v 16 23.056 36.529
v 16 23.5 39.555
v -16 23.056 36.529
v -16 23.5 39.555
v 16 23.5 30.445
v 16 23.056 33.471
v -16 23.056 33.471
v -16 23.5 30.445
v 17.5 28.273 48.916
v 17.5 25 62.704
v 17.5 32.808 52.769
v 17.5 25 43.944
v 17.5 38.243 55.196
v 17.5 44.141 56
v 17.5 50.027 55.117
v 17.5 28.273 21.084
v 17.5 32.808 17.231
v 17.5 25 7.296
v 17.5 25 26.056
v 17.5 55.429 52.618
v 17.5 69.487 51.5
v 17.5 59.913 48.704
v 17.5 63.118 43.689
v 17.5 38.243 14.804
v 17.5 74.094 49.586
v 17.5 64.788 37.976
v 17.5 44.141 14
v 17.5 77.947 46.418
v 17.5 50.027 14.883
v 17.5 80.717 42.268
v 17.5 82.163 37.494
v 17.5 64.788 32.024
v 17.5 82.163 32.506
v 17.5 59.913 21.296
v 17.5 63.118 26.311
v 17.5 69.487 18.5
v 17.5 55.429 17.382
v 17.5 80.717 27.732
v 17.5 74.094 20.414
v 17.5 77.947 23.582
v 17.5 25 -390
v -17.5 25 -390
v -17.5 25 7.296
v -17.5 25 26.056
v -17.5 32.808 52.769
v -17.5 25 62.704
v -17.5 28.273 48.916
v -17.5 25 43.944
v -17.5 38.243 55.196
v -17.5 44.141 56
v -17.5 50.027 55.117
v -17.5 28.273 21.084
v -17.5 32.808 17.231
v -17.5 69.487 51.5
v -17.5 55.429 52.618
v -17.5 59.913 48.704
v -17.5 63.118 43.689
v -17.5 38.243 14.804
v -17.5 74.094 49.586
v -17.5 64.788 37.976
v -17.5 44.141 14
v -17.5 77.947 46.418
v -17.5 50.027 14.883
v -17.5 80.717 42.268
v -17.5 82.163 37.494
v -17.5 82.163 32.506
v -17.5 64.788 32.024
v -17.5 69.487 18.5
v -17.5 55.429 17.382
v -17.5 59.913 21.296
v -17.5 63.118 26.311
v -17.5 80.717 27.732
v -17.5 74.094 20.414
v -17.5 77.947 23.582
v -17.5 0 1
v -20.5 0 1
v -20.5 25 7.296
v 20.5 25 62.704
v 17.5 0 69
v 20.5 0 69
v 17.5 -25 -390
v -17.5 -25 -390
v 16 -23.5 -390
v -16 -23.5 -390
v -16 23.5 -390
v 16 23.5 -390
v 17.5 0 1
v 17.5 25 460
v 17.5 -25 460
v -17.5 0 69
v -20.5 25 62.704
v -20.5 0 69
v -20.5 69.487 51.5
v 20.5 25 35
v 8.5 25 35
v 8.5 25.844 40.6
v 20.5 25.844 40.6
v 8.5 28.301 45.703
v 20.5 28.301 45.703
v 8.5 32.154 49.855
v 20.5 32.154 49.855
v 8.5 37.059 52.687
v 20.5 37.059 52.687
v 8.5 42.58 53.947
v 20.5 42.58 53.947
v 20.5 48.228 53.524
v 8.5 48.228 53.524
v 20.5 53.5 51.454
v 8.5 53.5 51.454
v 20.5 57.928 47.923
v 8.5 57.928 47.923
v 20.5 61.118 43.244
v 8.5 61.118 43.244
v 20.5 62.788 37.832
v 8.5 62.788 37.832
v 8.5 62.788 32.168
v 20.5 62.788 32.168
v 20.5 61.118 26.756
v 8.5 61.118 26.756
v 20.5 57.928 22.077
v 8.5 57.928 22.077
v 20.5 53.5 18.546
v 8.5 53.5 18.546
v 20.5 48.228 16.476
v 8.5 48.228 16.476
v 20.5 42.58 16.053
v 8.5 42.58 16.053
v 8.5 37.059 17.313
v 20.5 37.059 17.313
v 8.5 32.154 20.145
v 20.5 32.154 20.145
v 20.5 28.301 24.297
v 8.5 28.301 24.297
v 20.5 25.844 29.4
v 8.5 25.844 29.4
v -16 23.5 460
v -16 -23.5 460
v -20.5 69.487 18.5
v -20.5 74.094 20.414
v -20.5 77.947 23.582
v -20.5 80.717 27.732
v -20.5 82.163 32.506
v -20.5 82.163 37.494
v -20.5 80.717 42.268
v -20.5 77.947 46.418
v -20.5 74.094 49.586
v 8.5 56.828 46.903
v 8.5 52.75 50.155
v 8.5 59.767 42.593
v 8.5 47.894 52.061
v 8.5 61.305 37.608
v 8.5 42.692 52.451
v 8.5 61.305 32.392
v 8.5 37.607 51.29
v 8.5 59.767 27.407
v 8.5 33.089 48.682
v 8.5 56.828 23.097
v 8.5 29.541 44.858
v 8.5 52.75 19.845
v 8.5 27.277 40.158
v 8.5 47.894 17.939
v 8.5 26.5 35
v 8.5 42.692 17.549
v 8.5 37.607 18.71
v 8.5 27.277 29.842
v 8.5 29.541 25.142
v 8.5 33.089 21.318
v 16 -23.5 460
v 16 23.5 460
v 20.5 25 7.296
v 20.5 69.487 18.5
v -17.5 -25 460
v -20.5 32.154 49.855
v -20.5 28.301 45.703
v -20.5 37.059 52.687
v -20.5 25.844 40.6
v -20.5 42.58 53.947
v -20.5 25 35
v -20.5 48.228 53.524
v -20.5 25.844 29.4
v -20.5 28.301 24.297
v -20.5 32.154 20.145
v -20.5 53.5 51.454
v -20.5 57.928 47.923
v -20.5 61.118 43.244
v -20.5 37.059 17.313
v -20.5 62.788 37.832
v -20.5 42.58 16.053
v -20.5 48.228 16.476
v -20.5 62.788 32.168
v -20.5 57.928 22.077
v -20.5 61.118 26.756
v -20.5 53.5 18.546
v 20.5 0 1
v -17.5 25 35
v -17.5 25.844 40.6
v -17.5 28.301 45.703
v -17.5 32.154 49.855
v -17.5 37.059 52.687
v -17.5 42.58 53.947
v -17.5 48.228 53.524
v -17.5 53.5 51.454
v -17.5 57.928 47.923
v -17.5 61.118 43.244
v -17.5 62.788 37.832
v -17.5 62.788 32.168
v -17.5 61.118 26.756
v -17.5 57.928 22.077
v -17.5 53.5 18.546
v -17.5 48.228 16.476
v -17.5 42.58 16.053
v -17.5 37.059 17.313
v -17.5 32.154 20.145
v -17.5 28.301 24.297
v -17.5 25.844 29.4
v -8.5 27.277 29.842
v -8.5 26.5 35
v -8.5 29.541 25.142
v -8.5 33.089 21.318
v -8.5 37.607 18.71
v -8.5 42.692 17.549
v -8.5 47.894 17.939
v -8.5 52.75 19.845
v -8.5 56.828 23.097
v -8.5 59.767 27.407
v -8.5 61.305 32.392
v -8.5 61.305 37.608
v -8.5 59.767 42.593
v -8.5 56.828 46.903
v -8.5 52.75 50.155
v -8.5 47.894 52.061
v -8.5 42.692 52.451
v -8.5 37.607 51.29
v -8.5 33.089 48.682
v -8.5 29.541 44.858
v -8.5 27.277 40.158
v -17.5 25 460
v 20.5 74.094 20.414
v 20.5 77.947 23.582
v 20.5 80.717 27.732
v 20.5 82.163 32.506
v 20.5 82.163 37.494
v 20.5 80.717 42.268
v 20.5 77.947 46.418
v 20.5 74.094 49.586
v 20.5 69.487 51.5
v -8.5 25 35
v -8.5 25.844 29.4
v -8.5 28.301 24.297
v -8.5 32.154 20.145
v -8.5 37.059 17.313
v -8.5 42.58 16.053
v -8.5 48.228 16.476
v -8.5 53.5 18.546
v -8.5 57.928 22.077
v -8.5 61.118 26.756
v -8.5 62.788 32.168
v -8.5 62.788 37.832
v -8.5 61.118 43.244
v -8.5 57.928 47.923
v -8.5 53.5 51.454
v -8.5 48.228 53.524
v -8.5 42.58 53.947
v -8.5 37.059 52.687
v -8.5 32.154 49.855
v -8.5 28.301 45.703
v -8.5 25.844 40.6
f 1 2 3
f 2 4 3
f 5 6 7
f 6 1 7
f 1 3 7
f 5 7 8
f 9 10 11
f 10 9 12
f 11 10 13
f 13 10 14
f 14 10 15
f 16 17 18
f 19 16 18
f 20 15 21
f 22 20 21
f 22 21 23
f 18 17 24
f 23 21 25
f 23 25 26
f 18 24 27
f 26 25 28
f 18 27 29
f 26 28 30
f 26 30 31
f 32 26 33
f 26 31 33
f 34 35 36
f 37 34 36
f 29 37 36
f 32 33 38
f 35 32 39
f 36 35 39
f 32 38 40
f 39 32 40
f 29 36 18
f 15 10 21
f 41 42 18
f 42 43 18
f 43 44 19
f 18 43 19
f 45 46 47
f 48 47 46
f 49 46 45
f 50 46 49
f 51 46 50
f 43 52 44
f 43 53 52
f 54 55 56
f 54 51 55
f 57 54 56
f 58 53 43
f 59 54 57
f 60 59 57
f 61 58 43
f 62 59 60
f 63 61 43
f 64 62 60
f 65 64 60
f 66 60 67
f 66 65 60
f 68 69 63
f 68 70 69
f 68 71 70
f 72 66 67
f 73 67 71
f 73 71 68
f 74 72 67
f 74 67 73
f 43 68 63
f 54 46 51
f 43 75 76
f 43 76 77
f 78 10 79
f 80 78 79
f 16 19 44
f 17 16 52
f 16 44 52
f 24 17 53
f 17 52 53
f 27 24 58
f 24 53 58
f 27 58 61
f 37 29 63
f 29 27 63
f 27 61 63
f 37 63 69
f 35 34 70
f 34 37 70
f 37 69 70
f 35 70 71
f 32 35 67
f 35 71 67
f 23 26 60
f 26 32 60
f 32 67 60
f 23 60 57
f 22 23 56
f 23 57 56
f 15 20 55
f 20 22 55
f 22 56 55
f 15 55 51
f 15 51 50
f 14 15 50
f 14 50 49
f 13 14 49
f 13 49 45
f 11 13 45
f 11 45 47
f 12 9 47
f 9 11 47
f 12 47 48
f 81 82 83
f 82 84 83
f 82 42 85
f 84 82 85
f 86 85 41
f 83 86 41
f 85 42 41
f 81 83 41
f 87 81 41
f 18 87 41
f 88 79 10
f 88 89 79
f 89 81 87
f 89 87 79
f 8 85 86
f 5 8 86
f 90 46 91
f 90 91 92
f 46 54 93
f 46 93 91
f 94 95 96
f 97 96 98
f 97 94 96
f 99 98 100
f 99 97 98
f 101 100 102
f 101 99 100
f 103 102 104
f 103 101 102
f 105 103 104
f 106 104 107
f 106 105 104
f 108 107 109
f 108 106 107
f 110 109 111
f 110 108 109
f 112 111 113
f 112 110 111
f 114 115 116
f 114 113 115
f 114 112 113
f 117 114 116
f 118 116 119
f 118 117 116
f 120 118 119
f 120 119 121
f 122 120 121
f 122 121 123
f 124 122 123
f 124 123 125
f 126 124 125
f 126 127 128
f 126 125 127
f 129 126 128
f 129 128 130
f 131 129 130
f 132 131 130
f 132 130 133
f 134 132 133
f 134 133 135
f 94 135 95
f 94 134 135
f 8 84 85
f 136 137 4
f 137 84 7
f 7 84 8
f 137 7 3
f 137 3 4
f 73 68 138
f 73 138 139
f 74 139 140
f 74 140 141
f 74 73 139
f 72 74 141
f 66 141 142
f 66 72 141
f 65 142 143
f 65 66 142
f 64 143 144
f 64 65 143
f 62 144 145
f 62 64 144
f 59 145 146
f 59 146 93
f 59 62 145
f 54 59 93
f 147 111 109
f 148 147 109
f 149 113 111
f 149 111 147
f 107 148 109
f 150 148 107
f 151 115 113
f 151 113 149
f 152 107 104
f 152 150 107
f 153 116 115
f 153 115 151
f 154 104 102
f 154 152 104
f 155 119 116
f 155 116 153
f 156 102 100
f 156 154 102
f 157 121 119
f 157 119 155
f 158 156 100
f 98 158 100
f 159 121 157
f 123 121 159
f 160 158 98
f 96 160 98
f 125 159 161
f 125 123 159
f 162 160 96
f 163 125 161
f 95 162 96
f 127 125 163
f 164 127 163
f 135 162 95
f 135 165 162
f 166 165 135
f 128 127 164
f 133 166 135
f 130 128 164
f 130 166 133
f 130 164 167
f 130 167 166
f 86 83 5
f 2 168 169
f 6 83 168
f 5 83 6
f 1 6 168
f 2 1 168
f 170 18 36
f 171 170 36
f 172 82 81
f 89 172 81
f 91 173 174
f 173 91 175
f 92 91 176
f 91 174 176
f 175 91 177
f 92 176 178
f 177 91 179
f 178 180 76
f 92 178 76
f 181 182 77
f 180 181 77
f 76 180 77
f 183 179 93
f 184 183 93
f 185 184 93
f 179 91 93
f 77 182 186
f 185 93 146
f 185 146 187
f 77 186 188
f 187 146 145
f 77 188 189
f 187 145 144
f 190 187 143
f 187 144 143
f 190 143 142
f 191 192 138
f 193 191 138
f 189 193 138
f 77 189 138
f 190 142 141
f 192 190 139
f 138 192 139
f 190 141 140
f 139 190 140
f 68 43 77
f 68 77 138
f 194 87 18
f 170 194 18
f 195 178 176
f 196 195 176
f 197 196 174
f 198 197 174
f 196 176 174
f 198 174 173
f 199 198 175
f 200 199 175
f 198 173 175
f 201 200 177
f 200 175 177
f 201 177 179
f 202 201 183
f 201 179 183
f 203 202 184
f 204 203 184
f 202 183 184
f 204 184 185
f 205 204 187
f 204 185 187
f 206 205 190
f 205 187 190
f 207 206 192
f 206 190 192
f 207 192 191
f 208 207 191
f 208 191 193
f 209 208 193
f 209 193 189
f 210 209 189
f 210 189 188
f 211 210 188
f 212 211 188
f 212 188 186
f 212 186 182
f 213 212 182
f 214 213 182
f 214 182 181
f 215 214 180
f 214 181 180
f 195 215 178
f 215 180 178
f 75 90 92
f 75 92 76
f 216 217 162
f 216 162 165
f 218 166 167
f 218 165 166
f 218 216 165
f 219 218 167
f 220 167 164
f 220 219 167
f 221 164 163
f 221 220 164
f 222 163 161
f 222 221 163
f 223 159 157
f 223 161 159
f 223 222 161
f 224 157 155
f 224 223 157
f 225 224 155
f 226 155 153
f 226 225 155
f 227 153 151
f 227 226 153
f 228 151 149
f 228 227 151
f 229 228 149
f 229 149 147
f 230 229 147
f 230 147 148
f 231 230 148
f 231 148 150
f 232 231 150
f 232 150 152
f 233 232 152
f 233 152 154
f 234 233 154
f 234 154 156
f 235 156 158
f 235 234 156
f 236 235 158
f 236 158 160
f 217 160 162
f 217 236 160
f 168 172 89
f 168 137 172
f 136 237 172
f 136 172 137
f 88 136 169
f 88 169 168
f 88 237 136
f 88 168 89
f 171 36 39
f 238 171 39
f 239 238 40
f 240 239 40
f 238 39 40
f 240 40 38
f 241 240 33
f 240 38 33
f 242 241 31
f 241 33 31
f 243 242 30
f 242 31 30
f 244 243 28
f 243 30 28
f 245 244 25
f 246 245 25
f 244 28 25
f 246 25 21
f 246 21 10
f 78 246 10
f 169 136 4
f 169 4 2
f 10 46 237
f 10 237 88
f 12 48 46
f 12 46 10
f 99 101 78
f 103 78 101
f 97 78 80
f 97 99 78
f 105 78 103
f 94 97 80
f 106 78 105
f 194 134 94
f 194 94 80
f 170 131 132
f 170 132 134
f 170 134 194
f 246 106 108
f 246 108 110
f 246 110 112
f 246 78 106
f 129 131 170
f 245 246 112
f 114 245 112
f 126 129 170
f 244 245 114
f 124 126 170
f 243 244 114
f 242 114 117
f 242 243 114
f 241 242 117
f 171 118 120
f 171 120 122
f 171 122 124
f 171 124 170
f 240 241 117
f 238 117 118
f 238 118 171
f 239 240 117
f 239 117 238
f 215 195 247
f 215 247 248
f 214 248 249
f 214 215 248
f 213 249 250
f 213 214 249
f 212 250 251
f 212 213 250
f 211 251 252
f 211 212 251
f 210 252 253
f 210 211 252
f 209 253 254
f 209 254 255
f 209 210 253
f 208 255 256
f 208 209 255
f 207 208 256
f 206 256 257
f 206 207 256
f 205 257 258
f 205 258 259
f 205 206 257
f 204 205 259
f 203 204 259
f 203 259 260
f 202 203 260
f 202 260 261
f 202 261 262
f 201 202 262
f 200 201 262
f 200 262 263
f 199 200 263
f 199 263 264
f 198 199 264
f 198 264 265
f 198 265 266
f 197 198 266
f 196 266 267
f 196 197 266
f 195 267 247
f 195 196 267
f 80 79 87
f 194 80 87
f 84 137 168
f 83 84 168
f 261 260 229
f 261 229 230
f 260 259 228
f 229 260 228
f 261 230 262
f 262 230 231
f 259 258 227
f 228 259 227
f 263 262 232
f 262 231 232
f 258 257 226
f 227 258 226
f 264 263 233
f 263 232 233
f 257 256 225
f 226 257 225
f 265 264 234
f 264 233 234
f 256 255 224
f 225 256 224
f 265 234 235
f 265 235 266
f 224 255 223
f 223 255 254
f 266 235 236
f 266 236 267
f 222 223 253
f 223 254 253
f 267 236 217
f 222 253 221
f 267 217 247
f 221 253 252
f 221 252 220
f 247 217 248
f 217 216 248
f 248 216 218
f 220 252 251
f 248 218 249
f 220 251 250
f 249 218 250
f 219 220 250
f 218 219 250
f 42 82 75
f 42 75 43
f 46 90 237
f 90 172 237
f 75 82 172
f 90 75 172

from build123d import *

# Parameters (mm, degrees)
SKETCH1_W           = 35
SKETCH1_H           = 50
SKETCH1_W_2         = 32
SKETCH1_H_2         = 47
BOSS_EXTRUDE1_DEPTH = 460
BOSS_EXTRUDE2_DEPTH = 3
SKETCH3_R           = 19
CUT_EXTRUDE1_DEPTH  = 3
SKETCH5_R           = 21
SKETCH5_R_2         = 17.5
BOSS_EXTRUDE7_DEPTH = 35
SKETCH6_R           = 19
CUT_EXTRUDE2_DEPTH  = 9
SKETCH1_2_W         = 35
SKETCH1_2_H         = 50
SKETCH1_2_W_2       = 32
SKETCH1_2_H_2       = 47
BOSS_EXTRUDE8_DEPTH = 390


with BuildPart() as part:
    # Sketch1 → Boss-Extrude1 (new body)
    with BuildSketch(Plane.XY):
        Rectangle(SKETCH1_W, SKETCH1_H)
        Rectangle(SKETCH1_W_2, SKETCH1_H_2, mode=Mode.SUBTRACT)
    extrude(amount=BOSS_EXTRUDE1_DEPTH)

    # Sketch2 → Boss-Extrude2 (add)
    with BuildSketch(Plane.ZY.offset(17.5)):
        with BuildLine():
            Line((1, 0), (7.296110466, 25))
            Line((7.296110466, 25), (18.5, 69.487344987))
            ThreePointArc((18.5, 69.487344987), (35, 82.347129464), (51.5, 69.487344987))
            Line((51.5, 69.487344987), (62.703889534, 25))
            Line((62.703889534, 25), (69, 0))
            Line((69, 0), (1, 0))
        make_face()
    boss_extrude2 = extrude(amount=BOSS_EXTRUDE2_DEPTH)

    # Sketch3 → Cut-Extrude1 (cut)
    with BuildSketch(Plane.ZY.offset(20.5)):
        with Locations(Location((35, 44, 0), (0, 0, 270))):
            Circle(SKETCH3_R)
    cut_extrude1 = extrude(amount=-CUT_EXTRUDE1_DEPTH, mode=Mode.SUBTRACT)

    # Mirror1: Boss-Extrude2, Cut-Extrude1 across plane
    add(boss_extrude2.mirror(Plane(origin=(0, 0, 0), x_dir=(0, 0, 1), z_dir=(1, 0, 0))))
    add(cut_extrude1.mirror(Plane(origin=(0, 0, 0), x_dir=(0, 0, 1), z_dir=(1, 0, 0))), mode=Mode.SUBTRACT)

    # Sketch5 → Boss-Extrude7 (add)
    with BuildSketch(Plane(origin=(-17.5, 0, 0), x_dir=(0, 0, -1), z_dir=(1, 0, 0))):
        with Locations((-35, 44)):
            Circle(SKETCH5_R)
        with Locations(Location((-35, 44, 0), (0, 0, 270))):
            Circle(SKETCH5_R_2, mode=Mode.SUBTRACT)
    extrude(amount=BOSS_EXTRUDE7_DEPTH)

    # Sketch6 → Cut-Extrude2 (cut)
    with BuildSketch(Plane(origin=(17.5, 0, 0), x_dir=(0, 0, -1), z_dir=(1, 0, 0))):
        with Locations(Location((-35, 44, 0), (0, 0, 270))):
            Circle(SKETCH6_R)
    cut_extrude2 = extrude(amount=-CUT_EXTRUDE2_DEPTH, mode=Mode.SUBTRACT)

    # Mirror2: Cut-Extrude2 across plane
    add(cut_extrude2.mirror(Plane(origin=(0, 0, 0), x_dir=(0, 0, 1), z_dir=(1, 0, 0))), mode=Mode.SUBTRACT)

    # Sketch1<2> → Boss-Extrude8 (add)
    with BuildSketch(Plane.XY):
        Rectangle(SKETCH1_2_W, SKETCH1_2_H)
        Rectangle(SKETCH1_2_W_2, SKETCH1_2_H_2, mode=Mode.SUBTRACT)
    extrude(amount=-BOSS_EXTRUDE8_DEPTH)


solid = part.part
